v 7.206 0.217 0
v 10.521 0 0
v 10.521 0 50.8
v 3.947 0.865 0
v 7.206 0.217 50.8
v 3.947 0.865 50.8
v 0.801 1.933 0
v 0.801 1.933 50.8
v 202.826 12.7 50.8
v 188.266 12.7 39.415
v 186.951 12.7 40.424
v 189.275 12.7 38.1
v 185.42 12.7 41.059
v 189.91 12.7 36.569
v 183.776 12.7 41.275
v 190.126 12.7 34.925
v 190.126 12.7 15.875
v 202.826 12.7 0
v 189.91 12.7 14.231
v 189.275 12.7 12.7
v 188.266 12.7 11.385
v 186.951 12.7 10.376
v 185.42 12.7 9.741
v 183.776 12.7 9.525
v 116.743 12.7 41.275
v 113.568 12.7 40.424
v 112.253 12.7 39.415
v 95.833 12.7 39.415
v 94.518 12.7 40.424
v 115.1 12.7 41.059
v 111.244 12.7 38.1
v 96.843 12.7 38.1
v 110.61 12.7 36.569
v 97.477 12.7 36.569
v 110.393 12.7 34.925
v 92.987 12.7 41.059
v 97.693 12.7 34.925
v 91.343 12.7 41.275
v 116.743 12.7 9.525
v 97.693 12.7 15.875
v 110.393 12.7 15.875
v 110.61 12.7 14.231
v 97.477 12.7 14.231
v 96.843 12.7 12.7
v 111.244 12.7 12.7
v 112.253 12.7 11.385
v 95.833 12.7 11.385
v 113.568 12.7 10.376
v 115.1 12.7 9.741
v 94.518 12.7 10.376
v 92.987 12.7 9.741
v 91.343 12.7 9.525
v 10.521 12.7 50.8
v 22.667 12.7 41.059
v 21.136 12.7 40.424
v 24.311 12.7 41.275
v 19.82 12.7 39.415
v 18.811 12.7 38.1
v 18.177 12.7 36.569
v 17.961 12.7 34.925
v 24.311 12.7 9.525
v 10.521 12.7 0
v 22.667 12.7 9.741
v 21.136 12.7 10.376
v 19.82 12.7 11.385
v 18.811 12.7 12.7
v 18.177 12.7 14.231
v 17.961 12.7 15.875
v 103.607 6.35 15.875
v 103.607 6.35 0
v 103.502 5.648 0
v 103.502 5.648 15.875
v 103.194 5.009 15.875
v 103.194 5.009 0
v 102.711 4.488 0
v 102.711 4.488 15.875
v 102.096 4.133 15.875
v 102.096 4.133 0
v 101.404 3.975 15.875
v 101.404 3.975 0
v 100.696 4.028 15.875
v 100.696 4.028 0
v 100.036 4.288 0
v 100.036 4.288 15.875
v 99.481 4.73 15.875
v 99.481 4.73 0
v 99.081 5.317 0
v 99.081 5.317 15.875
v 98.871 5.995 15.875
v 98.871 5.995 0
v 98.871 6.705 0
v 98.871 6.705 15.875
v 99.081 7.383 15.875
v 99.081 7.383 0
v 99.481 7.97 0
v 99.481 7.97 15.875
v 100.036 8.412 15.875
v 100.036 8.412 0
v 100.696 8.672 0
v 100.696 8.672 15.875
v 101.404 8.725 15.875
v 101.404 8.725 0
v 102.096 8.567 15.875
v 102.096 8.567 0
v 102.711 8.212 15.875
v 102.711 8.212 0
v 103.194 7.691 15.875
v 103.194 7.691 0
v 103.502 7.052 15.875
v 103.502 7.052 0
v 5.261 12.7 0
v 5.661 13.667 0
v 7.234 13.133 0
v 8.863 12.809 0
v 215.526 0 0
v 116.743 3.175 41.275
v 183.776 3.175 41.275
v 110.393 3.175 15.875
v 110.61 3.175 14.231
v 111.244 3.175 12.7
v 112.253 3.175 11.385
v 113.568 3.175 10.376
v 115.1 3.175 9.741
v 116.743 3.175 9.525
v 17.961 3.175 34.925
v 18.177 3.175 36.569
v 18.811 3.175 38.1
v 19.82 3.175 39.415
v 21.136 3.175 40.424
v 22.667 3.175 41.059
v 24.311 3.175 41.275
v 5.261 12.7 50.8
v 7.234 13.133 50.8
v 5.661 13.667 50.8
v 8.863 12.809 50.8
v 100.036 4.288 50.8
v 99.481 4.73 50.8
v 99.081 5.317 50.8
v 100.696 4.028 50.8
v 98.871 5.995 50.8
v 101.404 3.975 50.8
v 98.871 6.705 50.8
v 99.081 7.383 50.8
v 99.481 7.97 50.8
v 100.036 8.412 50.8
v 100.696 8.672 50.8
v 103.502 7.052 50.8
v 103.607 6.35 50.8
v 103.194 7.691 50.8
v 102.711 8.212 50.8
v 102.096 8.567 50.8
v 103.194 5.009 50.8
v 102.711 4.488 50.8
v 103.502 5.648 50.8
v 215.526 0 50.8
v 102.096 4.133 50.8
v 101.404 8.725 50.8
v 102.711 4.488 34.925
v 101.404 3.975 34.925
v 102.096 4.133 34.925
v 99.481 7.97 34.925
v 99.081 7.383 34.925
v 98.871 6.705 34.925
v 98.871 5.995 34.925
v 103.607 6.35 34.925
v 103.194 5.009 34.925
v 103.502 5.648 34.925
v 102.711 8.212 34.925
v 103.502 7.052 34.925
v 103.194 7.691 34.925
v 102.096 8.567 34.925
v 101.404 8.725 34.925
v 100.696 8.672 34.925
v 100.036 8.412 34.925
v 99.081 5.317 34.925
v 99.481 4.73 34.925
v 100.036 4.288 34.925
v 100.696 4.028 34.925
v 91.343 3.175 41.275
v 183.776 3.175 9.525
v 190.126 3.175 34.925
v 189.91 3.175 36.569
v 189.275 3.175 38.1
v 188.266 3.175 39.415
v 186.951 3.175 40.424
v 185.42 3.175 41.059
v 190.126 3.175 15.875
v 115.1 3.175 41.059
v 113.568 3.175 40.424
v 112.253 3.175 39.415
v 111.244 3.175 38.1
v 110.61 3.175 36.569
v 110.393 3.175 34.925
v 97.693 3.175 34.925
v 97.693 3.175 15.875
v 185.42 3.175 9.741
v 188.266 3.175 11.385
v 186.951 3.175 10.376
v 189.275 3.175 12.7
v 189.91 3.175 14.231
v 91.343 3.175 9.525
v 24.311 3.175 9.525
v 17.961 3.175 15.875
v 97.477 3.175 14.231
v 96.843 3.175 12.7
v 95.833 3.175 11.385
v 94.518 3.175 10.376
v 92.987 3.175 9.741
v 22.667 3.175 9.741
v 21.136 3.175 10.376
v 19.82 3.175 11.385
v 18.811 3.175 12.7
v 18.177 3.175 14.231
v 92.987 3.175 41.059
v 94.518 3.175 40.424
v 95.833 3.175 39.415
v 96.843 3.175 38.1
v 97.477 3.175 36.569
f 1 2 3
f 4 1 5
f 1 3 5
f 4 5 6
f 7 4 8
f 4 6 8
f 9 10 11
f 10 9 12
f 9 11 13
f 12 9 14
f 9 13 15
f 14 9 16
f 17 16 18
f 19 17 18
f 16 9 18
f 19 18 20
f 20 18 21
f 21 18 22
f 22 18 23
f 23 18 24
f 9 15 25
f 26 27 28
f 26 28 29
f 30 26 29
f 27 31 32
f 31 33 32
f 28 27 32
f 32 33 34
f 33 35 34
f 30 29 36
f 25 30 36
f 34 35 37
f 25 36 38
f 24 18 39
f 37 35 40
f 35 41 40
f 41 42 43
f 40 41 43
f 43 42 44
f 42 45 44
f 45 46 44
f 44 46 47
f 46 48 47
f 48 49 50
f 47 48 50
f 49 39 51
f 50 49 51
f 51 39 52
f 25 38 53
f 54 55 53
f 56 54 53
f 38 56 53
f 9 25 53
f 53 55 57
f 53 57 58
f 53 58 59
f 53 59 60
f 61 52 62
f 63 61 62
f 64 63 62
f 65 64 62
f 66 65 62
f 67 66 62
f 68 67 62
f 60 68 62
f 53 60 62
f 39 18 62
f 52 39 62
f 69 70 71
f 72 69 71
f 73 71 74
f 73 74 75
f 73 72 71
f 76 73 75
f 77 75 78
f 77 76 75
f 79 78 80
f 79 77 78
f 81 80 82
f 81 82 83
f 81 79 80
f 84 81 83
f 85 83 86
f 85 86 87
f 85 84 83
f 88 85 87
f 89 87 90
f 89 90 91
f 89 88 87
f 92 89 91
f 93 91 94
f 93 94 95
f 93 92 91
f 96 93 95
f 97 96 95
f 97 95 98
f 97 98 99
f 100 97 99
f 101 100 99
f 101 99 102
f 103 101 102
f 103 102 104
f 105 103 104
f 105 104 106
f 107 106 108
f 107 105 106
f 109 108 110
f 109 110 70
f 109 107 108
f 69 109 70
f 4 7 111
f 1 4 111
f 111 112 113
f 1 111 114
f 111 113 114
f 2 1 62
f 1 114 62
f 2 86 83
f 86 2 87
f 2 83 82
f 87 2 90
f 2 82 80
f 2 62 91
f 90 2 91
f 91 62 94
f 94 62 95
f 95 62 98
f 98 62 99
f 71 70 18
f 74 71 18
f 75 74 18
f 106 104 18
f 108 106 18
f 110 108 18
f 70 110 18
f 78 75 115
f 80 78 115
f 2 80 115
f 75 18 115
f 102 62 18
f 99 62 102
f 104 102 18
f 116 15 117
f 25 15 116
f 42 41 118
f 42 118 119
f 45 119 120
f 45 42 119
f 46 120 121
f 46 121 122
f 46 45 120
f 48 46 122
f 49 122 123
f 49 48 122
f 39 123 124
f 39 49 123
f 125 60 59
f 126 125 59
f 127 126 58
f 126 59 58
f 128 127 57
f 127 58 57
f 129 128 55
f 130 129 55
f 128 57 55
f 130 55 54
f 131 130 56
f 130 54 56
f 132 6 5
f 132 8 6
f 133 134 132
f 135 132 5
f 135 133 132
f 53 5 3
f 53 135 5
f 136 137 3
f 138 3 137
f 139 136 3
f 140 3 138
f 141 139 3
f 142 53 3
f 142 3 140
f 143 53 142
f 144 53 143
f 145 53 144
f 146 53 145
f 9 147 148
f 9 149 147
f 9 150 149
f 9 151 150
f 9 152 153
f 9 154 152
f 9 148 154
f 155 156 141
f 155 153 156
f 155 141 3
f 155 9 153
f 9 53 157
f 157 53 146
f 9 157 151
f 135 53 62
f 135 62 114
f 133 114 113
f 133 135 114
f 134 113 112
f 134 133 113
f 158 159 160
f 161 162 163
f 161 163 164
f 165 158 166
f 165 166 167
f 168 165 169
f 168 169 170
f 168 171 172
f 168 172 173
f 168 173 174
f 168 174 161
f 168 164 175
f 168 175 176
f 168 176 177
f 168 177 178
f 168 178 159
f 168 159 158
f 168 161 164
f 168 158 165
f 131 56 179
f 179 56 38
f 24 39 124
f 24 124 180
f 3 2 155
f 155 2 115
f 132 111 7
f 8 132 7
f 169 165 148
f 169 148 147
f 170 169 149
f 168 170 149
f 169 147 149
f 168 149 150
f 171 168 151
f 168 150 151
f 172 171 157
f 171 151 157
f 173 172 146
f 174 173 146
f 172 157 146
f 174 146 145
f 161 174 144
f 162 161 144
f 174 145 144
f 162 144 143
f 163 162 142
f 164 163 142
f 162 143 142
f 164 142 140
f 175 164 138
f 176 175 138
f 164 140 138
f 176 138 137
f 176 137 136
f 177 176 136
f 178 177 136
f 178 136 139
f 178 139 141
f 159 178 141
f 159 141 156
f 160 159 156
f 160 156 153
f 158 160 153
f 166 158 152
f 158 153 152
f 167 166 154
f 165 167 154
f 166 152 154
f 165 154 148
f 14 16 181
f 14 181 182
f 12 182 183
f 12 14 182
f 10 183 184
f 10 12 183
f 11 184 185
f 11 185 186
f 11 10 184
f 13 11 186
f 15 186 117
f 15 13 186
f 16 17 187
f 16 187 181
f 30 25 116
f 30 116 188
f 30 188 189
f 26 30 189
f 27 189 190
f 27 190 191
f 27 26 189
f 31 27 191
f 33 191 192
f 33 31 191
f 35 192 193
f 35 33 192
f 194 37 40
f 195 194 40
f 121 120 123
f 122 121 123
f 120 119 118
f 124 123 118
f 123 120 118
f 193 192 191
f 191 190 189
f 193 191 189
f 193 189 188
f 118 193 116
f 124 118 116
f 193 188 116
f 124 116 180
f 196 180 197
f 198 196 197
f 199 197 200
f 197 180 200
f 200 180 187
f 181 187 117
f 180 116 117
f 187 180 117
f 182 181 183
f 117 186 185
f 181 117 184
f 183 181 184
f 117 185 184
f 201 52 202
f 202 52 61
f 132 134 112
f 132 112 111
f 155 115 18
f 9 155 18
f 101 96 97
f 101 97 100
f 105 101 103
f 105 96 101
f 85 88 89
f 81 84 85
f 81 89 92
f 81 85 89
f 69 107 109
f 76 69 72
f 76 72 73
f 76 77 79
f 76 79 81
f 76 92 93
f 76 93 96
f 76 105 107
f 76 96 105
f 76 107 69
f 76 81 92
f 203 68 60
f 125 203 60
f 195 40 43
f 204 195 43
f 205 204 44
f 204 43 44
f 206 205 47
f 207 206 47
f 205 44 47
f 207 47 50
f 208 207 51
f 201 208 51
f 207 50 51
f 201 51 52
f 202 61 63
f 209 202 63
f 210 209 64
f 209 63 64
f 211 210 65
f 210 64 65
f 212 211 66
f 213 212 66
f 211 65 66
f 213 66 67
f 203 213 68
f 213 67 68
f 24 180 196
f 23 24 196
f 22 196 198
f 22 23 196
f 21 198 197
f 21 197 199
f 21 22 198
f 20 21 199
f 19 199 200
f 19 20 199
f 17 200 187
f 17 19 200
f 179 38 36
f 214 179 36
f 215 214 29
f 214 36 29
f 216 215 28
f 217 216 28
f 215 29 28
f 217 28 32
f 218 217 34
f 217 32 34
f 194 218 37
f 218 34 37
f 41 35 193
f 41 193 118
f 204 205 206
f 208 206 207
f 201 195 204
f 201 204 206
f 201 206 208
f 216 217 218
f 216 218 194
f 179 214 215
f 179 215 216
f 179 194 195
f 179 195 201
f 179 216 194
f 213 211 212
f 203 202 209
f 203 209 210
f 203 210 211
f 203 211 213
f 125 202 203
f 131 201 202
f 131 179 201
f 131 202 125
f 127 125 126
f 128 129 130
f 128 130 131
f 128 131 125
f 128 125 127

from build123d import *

# Parameters (mm, degrees)
EXTRUDE1_DEPTH     = 50.8
CUT_EXTRUDE1_DEPTH = 9.525
SKETCH3_R          = 2.38125
CUT_EXTRUDE2_DEPTH = 15.875
CUT_EXTRUDE3_START = -15.875
SKETCH4_R          = 2.38125
CUT_EXTRUDE3_DEPTH = 15.875
CUT_EXTRUDE4_DEPTH = 222.795964766
EXTRUDE2_DEPTH     = 50.8


with BuildPart() as part:
    # Sketch1 → Extrude1 (new body)
    with BuildSketch(Plane.XY):
        Polygon((0, 0), (215.526146874, 0), (202.826146874, 12.7), (5.260512242, 12.7), align=None)
    extrude(amount=EXTRUDE1_DEPTH)

    # Sketch2 → Cut-Extrude1 (cut)
    with BuildSketch(Plane(origin=(0, 12.7, 0), x_dir=(-1, 0, 0), z_dir=(0, 1, 0))):
        with BuildLine():
            Line((-183.776146874, 41.275), (-116.743329558, 41.275))
            ThreePointArc((-116.743329558, 41.275), (-112.253201498, 39.415128061), (-110.393329558, 34.925))
            Line((-110.393329558, 34.925), (-110.393329558, 15.875))
            ThreePointArc((-110.393329558, 15.875), (-112.253201498, 11.384871939), (-116.743329558, 9.525))
            Line((-116.743329558, 9.525), (-183.776146874, 9.525))
            ThreePointArc((-183.776146874, 9.525), (-188.266274935, 11.384871939), (-190.126146874, 15.875))
            Line((-190.126146874, 15.875), (-190.126146874, 34.925))
            ThreePointArc((-190.126146874, 34.925), (-188.266274935, 39.415128061), (-183.776146874, 41.275))
        make_face()
        with BuildLine():
            Line((-91.343329558, 9.525), (-24.310512242, 9.525))
            ThreePointArc((-24.310512242, 9.525), (-19.820384182, 11.384871939), (-17.960512242, 15.875))
            Line((-17.960512242, 15.875), (-17.960512242, 34.925))
            ThreePointArc((-17.960512242, 34.925), (-19.820384182, 39.415128061), (-24.310512242, 41.275))
            Line((-24.310512242, 41.275), (-91.343329558, 41.275))
            ThreePointArc((-91.343329558, 41.275), (-95.833457619, 39.415128061), (-97.693329558, 34.925))
            Line((-97.693329558, 34.925), (-97.693329558, 15.875))
            ThreePointArc((-97.693329558, 15.875), (-95.833457619, 11.384871939), (-91.343329558, 9.525))
        make_face()
    extrude(amount=-CUT_EXTRUDE1_DEPTH, mode=Mode.SUBTRACT)

    # Sketch3 → Cut-Extrude2 (cut)
    with BuildSketch(Plane.XY.offset(50.8)):
        with Locations((101.226146874, 6.35)):
            Circle(SKETCH3_R)
    extrude(amount=-CUT_EXTRUDE2_DEPTH, mode=Mode.SUBTRACT)

    # Sketch4 → Cut-Extrude3 (cut)
    with BuildSketch(Plane(origin=(0, 0, 0), x_dir=(-1, 0, 0), z_dir=(0, 0, -1)).offset(CUT_EXTRUDE3_START)):
        with Locations(Location((-101.226146874, 6.35, 0), (0, 0, 180))):
            Circle(SKETCH4_R)
    extrude(amount=CUT_EXTRUDE3_DEPTH, mode=Mode.SUBTRACT)

    # Sketch5 → Cut-Extrude4 (cut, through all)
    with BuildSketch(Plane.XY.offset(50.8)):
        with BuildLine():
            Line((0.800865302, 1.933459874), (0, 0))
            Line((0, 0), (10.521024484, 0))
            ThreePointArc((10.521024484, 0), (5.565730305, 0.488053878), (0.800865302, 1.933459874))
        make_face()
    extrude(amount=-CUT_EXTRUDE4_DEPTH, mode=Mode.SUBTRACT)

    # Sketch6 → Extrude2 (add)
    with BuildSketch(Plane.XY.offset(50.8)):
        with BuildLine():
            Line((5.660944893, 13.666729937), (5.260512242, 12.7))
            Line((5.260512242, 12.7), (10.521024484, 12.7))
            ThreePointArc((10.521024484, 12.7), (8.043377395, 12.944026939), (5.660944893, 13.666729937))
        make_face()
    extrude(amount=-EXTRUDE2_DEPTH)


solid = part.part
